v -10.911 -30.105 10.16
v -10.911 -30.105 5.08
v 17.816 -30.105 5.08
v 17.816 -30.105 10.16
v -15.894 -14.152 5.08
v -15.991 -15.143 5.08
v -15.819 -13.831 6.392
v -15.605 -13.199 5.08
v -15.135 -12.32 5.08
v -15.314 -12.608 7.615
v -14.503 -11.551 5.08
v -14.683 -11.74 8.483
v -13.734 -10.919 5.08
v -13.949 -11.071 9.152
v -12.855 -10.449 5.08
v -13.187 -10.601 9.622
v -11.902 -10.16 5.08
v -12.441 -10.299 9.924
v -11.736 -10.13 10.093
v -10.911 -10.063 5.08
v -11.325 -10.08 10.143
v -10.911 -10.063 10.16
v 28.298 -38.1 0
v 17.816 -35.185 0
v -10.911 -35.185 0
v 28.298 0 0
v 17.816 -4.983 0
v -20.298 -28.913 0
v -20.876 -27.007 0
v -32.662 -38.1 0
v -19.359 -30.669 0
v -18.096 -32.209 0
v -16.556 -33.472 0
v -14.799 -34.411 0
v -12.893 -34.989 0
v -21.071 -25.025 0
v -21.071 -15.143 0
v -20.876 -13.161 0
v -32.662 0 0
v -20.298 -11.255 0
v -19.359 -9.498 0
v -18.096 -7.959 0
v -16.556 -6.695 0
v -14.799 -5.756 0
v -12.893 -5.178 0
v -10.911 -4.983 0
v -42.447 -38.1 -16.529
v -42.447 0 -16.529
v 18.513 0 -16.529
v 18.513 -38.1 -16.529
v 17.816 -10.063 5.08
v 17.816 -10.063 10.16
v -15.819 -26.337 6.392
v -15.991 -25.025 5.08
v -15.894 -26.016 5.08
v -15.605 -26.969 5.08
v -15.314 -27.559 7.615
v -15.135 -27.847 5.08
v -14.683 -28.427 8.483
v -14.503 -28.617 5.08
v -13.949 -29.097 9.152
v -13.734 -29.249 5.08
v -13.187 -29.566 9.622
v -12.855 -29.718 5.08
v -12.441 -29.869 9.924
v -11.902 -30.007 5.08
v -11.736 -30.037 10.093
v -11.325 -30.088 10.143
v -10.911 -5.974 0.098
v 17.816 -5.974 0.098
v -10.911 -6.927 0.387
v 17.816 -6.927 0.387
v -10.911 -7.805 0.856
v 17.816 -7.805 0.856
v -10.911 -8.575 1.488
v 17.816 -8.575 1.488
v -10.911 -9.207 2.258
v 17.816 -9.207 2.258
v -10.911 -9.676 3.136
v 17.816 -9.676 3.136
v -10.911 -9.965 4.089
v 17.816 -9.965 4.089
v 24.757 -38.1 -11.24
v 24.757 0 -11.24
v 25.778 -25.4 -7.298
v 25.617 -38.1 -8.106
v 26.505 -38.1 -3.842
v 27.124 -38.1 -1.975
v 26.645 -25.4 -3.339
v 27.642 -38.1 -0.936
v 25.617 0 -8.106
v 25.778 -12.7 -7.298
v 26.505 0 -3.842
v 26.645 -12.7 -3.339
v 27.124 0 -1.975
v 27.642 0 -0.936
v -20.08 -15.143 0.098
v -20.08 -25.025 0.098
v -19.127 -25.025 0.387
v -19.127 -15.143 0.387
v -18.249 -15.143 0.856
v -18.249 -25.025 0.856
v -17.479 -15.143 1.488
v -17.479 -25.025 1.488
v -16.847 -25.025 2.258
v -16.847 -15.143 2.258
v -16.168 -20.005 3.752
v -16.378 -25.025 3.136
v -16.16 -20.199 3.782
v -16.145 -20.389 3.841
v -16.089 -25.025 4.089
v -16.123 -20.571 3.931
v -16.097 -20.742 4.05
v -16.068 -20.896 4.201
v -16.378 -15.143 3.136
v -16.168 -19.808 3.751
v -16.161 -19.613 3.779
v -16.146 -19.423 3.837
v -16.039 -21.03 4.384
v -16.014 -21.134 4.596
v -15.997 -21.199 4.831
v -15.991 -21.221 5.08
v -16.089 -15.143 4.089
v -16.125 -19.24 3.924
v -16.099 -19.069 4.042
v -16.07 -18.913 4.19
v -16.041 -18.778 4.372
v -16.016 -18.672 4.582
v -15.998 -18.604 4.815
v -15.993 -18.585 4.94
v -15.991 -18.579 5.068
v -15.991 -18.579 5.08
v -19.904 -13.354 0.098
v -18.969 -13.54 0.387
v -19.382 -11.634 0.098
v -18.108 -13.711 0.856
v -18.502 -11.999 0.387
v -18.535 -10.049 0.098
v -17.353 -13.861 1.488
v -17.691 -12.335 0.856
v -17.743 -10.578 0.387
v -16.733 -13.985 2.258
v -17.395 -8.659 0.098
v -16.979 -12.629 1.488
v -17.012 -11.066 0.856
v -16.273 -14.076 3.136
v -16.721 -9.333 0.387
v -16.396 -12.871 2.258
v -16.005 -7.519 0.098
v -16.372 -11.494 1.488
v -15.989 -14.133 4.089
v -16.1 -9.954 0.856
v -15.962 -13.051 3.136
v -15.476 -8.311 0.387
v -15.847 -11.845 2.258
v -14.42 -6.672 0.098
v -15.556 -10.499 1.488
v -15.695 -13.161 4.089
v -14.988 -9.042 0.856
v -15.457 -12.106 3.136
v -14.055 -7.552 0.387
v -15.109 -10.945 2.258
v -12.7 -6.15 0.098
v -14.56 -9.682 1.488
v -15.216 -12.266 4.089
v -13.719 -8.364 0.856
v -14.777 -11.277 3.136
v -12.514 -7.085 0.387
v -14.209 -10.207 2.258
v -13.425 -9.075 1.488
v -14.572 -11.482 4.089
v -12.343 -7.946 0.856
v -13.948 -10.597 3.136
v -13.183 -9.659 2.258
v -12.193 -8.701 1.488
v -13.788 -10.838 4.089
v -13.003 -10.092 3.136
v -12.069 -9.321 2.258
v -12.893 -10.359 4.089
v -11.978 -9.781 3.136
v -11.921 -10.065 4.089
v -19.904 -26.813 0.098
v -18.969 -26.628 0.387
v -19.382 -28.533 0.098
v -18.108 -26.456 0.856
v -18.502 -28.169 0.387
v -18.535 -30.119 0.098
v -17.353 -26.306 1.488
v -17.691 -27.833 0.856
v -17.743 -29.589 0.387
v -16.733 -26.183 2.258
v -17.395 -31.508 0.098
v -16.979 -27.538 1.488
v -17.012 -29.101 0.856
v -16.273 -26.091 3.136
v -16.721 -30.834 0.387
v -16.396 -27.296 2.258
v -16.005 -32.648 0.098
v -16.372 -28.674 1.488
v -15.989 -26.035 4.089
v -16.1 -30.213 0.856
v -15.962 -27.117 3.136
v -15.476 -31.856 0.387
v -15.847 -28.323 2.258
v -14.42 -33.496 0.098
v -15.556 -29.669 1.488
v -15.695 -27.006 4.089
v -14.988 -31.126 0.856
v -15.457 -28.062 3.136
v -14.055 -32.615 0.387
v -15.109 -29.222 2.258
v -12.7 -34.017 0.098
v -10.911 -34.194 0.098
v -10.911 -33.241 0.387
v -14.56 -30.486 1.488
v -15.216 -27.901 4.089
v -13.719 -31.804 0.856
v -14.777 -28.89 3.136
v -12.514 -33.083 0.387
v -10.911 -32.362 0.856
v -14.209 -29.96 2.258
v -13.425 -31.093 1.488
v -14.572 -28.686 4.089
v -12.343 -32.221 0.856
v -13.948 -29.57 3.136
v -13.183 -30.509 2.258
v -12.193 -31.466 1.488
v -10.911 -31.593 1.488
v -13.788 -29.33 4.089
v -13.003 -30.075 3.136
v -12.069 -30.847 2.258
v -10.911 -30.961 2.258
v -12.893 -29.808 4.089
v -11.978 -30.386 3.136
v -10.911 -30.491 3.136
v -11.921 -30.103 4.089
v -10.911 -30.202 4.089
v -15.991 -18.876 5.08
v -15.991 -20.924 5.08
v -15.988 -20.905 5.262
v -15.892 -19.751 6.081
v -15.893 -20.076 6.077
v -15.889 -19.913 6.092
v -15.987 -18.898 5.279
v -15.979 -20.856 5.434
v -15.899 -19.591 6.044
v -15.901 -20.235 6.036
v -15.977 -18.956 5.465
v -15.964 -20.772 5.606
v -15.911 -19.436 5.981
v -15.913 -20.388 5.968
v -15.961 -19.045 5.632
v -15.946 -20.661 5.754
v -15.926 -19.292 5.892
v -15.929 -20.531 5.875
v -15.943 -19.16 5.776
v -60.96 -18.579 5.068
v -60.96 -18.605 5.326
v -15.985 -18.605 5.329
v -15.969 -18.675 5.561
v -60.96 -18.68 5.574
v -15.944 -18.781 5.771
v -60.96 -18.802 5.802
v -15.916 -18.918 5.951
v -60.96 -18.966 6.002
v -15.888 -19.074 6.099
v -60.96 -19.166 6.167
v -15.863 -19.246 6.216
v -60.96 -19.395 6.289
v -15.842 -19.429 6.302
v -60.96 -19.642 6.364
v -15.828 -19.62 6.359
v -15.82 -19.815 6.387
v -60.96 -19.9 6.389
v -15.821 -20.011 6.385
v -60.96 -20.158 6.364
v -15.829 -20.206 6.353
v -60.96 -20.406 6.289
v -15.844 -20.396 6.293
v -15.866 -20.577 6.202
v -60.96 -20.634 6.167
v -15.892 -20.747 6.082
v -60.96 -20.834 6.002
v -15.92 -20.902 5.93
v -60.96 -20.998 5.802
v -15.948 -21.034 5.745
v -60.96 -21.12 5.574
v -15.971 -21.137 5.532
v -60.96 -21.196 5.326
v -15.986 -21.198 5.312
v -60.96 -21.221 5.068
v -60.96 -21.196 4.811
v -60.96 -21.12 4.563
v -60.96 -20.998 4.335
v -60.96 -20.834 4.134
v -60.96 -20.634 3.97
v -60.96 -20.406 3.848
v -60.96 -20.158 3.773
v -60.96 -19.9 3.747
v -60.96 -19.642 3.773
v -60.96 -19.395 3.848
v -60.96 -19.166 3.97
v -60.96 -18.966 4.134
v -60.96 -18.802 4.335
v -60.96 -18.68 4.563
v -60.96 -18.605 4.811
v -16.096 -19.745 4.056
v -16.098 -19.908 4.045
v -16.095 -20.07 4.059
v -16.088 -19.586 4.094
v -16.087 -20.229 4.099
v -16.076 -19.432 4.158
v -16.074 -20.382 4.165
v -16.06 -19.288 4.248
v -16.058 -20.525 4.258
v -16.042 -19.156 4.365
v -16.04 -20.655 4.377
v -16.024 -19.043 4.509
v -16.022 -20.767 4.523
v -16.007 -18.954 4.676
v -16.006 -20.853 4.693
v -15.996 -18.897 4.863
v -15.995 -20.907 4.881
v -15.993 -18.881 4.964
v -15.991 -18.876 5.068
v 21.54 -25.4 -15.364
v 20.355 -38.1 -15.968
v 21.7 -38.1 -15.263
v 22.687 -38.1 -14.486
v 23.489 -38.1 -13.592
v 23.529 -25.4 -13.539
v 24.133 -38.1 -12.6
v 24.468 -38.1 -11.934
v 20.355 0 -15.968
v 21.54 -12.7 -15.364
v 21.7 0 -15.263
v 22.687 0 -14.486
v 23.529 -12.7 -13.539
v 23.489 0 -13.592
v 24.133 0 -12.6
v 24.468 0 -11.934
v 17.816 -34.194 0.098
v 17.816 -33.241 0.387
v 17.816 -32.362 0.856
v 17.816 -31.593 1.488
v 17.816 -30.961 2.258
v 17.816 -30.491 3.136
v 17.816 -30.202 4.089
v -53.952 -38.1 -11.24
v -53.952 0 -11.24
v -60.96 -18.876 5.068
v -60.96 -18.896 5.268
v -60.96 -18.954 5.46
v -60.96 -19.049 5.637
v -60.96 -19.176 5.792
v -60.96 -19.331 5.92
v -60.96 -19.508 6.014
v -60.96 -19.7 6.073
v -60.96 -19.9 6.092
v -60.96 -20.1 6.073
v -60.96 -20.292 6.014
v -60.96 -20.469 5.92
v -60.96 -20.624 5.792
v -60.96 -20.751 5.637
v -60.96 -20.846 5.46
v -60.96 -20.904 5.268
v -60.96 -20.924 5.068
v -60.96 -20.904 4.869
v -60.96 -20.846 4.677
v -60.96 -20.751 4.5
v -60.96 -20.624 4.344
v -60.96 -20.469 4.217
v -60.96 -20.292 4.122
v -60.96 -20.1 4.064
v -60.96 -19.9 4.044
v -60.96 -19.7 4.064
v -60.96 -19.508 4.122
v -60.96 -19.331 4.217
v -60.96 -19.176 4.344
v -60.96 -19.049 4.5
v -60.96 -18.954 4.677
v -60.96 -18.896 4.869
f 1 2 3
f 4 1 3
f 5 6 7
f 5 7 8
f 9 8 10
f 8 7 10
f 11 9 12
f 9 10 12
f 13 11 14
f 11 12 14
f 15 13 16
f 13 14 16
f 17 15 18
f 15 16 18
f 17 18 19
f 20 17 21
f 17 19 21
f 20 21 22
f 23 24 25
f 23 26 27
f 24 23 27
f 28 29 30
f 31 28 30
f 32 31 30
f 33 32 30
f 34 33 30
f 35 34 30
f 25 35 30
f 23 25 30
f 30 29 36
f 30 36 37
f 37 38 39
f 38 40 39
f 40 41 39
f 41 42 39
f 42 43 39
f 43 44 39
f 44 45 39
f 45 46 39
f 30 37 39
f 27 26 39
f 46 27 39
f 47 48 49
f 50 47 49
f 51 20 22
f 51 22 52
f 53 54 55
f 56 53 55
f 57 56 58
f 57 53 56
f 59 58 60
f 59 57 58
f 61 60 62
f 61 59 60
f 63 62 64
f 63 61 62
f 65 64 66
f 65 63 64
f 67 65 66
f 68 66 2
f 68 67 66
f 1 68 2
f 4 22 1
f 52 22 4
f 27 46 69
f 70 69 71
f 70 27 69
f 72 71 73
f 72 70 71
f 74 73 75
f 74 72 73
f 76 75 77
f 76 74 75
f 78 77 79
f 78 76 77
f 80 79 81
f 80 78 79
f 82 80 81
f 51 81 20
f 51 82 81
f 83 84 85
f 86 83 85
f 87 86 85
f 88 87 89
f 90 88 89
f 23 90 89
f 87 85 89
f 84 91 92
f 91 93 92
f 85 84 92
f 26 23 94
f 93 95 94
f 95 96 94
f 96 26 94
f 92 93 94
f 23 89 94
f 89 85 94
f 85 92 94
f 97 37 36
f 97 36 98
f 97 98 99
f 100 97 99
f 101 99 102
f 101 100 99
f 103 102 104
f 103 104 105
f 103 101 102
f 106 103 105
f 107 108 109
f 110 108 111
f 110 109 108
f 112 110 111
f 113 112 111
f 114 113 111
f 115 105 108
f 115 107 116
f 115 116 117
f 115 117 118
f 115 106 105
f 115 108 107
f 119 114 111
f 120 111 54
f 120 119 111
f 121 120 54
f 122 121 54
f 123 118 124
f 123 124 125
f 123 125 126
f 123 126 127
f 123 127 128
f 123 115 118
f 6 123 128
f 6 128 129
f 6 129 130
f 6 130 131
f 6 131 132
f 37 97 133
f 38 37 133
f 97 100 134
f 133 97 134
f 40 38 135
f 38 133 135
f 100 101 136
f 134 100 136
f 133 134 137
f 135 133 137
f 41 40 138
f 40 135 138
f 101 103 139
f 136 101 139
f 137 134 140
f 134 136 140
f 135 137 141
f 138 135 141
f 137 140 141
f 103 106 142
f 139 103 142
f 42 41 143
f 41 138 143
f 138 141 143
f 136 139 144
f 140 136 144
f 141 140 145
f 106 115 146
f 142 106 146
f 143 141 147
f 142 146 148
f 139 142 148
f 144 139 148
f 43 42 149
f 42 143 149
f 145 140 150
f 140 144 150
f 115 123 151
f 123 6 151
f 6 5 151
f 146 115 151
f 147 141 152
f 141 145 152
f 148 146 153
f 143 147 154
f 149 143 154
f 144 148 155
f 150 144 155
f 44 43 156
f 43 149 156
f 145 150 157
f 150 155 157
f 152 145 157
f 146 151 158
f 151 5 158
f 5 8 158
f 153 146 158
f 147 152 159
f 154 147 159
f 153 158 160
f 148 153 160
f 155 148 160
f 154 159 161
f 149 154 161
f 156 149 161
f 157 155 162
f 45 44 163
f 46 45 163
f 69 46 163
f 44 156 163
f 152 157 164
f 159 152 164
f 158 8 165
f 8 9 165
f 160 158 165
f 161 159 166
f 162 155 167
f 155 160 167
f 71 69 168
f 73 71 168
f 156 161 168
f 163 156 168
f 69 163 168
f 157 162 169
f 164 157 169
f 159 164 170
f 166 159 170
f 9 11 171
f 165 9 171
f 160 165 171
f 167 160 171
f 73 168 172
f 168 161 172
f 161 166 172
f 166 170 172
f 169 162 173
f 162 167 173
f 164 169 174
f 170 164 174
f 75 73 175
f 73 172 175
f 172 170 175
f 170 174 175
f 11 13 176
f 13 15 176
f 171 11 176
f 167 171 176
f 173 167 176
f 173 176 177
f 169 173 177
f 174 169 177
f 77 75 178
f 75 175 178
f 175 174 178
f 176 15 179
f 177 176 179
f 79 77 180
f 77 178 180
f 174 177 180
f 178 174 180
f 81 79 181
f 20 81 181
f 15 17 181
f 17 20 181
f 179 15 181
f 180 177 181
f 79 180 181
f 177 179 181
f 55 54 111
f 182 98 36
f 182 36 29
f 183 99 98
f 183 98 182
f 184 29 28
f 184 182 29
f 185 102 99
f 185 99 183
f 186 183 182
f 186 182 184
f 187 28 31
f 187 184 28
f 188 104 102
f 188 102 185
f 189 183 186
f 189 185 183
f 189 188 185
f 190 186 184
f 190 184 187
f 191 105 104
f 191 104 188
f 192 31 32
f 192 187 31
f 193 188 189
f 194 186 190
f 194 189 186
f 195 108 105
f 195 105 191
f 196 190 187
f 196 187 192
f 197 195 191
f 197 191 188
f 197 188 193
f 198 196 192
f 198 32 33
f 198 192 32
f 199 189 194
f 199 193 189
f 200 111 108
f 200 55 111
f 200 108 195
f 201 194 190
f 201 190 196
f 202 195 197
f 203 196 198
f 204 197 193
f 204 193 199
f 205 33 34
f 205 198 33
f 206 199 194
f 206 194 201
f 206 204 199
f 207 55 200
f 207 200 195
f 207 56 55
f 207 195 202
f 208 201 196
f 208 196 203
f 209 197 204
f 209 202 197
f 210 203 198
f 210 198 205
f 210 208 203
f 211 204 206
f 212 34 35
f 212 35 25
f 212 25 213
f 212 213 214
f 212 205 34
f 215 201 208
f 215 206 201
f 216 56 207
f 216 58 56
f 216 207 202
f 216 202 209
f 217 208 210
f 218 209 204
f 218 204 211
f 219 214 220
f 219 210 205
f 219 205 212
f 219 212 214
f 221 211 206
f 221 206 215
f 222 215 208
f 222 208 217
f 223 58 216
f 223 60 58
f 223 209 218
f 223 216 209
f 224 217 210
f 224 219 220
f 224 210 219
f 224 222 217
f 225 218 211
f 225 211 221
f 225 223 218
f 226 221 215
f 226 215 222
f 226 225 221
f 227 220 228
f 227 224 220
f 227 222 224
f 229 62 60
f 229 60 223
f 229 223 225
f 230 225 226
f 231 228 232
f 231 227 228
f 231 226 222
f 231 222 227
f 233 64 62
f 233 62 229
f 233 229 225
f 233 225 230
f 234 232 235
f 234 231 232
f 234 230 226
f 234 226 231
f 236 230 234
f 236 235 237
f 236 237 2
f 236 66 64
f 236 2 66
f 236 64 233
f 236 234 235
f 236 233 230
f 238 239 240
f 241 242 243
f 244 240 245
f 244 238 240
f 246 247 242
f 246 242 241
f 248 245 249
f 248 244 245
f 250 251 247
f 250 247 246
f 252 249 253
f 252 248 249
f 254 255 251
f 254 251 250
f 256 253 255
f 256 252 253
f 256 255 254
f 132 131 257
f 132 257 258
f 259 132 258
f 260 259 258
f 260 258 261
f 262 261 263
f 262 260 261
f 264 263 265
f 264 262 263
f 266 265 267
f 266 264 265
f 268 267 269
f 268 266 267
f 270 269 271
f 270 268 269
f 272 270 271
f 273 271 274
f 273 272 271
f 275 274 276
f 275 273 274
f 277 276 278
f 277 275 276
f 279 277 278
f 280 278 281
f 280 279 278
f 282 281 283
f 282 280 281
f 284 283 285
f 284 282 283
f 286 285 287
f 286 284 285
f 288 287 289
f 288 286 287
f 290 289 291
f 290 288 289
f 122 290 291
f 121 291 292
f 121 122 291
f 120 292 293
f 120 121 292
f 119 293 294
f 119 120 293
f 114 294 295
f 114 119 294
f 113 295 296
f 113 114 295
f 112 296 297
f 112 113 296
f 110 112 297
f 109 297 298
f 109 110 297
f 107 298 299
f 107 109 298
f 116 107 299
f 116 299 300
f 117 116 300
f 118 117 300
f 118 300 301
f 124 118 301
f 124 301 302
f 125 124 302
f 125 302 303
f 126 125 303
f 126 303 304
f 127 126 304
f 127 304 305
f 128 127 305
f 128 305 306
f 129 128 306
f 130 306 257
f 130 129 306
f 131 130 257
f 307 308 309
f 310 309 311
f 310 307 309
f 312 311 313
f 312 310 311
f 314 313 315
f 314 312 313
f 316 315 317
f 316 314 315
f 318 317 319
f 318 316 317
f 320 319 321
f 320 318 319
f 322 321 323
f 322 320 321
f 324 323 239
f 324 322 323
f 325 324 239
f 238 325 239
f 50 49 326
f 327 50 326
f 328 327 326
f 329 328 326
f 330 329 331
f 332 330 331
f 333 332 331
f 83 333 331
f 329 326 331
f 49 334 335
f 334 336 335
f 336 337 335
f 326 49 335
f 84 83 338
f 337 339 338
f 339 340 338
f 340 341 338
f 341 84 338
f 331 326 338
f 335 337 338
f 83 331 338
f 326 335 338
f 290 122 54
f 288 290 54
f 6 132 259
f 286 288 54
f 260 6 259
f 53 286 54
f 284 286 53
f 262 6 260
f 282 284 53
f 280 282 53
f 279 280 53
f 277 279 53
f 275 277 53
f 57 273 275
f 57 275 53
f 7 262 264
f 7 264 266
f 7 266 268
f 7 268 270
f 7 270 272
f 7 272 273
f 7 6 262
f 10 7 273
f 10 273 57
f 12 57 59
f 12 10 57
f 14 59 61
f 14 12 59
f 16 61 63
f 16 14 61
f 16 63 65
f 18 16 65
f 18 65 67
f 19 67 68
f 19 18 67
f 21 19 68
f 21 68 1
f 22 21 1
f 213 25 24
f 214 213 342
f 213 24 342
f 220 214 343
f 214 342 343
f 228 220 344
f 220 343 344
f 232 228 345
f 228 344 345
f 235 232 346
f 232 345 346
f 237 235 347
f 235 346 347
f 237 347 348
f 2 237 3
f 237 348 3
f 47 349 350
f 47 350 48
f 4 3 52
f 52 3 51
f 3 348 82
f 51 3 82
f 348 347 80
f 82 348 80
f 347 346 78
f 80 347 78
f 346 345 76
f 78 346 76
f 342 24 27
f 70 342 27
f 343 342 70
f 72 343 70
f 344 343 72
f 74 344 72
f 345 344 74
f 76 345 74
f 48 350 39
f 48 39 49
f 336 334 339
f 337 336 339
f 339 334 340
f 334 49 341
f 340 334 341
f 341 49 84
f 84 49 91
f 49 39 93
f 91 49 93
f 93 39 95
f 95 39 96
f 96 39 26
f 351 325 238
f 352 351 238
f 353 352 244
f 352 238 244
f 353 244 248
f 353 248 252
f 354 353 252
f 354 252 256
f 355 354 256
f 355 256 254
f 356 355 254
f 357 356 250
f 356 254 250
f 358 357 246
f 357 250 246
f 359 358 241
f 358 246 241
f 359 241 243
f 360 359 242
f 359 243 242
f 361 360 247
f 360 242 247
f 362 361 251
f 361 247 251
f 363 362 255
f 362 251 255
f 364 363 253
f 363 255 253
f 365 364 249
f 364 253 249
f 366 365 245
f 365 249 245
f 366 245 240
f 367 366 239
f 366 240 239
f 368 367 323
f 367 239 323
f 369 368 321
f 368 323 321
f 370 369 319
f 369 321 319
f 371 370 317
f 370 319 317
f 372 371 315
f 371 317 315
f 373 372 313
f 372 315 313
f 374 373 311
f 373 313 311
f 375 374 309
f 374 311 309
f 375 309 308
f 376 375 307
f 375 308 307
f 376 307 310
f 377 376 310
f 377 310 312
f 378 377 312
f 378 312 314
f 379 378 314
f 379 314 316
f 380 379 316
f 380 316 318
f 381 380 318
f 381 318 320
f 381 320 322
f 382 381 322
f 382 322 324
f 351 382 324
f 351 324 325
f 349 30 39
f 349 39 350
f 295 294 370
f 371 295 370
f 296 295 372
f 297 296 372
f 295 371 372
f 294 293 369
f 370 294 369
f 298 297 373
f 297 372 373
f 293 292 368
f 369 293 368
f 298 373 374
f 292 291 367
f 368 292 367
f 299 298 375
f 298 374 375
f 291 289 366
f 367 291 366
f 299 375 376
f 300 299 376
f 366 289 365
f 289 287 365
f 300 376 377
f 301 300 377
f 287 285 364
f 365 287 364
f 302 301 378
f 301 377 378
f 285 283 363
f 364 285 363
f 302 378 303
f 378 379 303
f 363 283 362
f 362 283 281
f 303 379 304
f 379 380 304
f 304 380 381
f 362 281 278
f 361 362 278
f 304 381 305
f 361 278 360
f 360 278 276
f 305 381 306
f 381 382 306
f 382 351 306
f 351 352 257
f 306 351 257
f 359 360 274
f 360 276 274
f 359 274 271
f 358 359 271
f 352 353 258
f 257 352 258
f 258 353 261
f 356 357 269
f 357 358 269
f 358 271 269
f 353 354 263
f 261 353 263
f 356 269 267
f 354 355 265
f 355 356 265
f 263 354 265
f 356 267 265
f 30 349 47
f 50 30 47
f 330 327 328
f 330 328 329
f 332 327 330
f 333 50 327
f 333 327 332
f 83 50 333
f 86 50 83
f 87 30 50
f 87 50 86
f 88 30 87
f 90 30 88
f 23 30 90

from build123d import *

# Parameters (mm, degrees)
F1_DEPTH = 38.1
F2_W     = 33.8070421275
F2_H     = 20.0418584555
F3_DEPTH = 10.16
F4_R     = 5.07999
F5_R     = 1.3208962066
F5_R_2   = 1.0238880826
F6_DEPTH = 60.96


# Not quite as in the source:
# - a fillet or chamfer is up to 0.001 mm smaller than in the source, because OpenCascade refuses the exact size
# - a feature names something its author has since deleted; it is built from what else it names


with BuildPart() as f1:
    # F0 (on Front) → F1 (new body)
    with BuildSketch(Plane.XZ):
        with BuildLine():
            Line((24.7568794588, -11.2399134781), (-53.9515846949, -11.2399134781))
            Line((-53.9515846949, -11.2399134781), (-42.4472021085, -16.5292843043))
            Line((-42.4472021085, -16.5292843043), (18.5127978915, -16.5292843043))
            add(Edge.make_bspline(
                [(18.5127978915, -16.5292843043), (22.1512323361, -15.7568533336), (23.817636294, -13.7140743109), (24.7568794588, -11.2399134781)],
                knots=[0, 0, 0, 0, 7.6693401108, 7.6693401108, 7.6693401108, 7.6693401108], degree=3))
        make_face()
        with BuildLine():
            Line((-32.6618658911, 0), (-53.9515846949, -11.2399134781))
            Line((-53.9515846949, -11.2399134781), (24.7568794588, -11.2399134781))
            add(Edge.make_bspline(
                [(24.7568794588, -11.2399134781), (26.1700602844, -7.5173027852), (25.9370894642, -2.8181269591), (28.2981341089, 0)],
                knots=[7.6693401108, 7.6693401108, 7.6693401108, 7.6693401108, 19.2085929859, 19.2085929859, 19.2085929859, 19.2085929859], degree=3))
            Line((28.2981341089, 0), (-32.6618658911, 0))
        make_face()
    extrude(amount=F1_DEPTH)

    # F2 (on Top) → F3 (join)
    with BuildSketch(Plane.XY):
        with Locations((0.9121662006, -20.0837139437)):
            Rectangle(F2_W, F2_H)
    extrude(amount=F3_DEPTH)

    # F4 (radius 5.08 in the source; OpenCascade refuses exactly that, so slightly less here)
    f4_edges = [f1.edges().sort_by_distance(p)[0] for p in [
        (-15.991355, -10.062785, 5.08),
        (-15.991355, -30.104643, 5.08),
        (-15.991355, -20.083714, 0),
        (-15.991355, -20.083714, 10.16),
        (0.912166, -30.104643, 0),
        (0.912166, -10.062785, 0),
    ]]
    fillet(f4_edges, radius=F4_R)

    # F5 (on Right) → F6 (join)
    with BuildSketch(Plane.YZ):
        with Locations((-19.9000276625, 5.0683720037)):
            Circle(F5_R)
        with Locations((-19.9000276625, 5.0683720037)):
            Circle(F5_R_2, mode=Mode.SUBTRACT)
    extrude(amount=-F6_DEPTH)


solid = f1.part
